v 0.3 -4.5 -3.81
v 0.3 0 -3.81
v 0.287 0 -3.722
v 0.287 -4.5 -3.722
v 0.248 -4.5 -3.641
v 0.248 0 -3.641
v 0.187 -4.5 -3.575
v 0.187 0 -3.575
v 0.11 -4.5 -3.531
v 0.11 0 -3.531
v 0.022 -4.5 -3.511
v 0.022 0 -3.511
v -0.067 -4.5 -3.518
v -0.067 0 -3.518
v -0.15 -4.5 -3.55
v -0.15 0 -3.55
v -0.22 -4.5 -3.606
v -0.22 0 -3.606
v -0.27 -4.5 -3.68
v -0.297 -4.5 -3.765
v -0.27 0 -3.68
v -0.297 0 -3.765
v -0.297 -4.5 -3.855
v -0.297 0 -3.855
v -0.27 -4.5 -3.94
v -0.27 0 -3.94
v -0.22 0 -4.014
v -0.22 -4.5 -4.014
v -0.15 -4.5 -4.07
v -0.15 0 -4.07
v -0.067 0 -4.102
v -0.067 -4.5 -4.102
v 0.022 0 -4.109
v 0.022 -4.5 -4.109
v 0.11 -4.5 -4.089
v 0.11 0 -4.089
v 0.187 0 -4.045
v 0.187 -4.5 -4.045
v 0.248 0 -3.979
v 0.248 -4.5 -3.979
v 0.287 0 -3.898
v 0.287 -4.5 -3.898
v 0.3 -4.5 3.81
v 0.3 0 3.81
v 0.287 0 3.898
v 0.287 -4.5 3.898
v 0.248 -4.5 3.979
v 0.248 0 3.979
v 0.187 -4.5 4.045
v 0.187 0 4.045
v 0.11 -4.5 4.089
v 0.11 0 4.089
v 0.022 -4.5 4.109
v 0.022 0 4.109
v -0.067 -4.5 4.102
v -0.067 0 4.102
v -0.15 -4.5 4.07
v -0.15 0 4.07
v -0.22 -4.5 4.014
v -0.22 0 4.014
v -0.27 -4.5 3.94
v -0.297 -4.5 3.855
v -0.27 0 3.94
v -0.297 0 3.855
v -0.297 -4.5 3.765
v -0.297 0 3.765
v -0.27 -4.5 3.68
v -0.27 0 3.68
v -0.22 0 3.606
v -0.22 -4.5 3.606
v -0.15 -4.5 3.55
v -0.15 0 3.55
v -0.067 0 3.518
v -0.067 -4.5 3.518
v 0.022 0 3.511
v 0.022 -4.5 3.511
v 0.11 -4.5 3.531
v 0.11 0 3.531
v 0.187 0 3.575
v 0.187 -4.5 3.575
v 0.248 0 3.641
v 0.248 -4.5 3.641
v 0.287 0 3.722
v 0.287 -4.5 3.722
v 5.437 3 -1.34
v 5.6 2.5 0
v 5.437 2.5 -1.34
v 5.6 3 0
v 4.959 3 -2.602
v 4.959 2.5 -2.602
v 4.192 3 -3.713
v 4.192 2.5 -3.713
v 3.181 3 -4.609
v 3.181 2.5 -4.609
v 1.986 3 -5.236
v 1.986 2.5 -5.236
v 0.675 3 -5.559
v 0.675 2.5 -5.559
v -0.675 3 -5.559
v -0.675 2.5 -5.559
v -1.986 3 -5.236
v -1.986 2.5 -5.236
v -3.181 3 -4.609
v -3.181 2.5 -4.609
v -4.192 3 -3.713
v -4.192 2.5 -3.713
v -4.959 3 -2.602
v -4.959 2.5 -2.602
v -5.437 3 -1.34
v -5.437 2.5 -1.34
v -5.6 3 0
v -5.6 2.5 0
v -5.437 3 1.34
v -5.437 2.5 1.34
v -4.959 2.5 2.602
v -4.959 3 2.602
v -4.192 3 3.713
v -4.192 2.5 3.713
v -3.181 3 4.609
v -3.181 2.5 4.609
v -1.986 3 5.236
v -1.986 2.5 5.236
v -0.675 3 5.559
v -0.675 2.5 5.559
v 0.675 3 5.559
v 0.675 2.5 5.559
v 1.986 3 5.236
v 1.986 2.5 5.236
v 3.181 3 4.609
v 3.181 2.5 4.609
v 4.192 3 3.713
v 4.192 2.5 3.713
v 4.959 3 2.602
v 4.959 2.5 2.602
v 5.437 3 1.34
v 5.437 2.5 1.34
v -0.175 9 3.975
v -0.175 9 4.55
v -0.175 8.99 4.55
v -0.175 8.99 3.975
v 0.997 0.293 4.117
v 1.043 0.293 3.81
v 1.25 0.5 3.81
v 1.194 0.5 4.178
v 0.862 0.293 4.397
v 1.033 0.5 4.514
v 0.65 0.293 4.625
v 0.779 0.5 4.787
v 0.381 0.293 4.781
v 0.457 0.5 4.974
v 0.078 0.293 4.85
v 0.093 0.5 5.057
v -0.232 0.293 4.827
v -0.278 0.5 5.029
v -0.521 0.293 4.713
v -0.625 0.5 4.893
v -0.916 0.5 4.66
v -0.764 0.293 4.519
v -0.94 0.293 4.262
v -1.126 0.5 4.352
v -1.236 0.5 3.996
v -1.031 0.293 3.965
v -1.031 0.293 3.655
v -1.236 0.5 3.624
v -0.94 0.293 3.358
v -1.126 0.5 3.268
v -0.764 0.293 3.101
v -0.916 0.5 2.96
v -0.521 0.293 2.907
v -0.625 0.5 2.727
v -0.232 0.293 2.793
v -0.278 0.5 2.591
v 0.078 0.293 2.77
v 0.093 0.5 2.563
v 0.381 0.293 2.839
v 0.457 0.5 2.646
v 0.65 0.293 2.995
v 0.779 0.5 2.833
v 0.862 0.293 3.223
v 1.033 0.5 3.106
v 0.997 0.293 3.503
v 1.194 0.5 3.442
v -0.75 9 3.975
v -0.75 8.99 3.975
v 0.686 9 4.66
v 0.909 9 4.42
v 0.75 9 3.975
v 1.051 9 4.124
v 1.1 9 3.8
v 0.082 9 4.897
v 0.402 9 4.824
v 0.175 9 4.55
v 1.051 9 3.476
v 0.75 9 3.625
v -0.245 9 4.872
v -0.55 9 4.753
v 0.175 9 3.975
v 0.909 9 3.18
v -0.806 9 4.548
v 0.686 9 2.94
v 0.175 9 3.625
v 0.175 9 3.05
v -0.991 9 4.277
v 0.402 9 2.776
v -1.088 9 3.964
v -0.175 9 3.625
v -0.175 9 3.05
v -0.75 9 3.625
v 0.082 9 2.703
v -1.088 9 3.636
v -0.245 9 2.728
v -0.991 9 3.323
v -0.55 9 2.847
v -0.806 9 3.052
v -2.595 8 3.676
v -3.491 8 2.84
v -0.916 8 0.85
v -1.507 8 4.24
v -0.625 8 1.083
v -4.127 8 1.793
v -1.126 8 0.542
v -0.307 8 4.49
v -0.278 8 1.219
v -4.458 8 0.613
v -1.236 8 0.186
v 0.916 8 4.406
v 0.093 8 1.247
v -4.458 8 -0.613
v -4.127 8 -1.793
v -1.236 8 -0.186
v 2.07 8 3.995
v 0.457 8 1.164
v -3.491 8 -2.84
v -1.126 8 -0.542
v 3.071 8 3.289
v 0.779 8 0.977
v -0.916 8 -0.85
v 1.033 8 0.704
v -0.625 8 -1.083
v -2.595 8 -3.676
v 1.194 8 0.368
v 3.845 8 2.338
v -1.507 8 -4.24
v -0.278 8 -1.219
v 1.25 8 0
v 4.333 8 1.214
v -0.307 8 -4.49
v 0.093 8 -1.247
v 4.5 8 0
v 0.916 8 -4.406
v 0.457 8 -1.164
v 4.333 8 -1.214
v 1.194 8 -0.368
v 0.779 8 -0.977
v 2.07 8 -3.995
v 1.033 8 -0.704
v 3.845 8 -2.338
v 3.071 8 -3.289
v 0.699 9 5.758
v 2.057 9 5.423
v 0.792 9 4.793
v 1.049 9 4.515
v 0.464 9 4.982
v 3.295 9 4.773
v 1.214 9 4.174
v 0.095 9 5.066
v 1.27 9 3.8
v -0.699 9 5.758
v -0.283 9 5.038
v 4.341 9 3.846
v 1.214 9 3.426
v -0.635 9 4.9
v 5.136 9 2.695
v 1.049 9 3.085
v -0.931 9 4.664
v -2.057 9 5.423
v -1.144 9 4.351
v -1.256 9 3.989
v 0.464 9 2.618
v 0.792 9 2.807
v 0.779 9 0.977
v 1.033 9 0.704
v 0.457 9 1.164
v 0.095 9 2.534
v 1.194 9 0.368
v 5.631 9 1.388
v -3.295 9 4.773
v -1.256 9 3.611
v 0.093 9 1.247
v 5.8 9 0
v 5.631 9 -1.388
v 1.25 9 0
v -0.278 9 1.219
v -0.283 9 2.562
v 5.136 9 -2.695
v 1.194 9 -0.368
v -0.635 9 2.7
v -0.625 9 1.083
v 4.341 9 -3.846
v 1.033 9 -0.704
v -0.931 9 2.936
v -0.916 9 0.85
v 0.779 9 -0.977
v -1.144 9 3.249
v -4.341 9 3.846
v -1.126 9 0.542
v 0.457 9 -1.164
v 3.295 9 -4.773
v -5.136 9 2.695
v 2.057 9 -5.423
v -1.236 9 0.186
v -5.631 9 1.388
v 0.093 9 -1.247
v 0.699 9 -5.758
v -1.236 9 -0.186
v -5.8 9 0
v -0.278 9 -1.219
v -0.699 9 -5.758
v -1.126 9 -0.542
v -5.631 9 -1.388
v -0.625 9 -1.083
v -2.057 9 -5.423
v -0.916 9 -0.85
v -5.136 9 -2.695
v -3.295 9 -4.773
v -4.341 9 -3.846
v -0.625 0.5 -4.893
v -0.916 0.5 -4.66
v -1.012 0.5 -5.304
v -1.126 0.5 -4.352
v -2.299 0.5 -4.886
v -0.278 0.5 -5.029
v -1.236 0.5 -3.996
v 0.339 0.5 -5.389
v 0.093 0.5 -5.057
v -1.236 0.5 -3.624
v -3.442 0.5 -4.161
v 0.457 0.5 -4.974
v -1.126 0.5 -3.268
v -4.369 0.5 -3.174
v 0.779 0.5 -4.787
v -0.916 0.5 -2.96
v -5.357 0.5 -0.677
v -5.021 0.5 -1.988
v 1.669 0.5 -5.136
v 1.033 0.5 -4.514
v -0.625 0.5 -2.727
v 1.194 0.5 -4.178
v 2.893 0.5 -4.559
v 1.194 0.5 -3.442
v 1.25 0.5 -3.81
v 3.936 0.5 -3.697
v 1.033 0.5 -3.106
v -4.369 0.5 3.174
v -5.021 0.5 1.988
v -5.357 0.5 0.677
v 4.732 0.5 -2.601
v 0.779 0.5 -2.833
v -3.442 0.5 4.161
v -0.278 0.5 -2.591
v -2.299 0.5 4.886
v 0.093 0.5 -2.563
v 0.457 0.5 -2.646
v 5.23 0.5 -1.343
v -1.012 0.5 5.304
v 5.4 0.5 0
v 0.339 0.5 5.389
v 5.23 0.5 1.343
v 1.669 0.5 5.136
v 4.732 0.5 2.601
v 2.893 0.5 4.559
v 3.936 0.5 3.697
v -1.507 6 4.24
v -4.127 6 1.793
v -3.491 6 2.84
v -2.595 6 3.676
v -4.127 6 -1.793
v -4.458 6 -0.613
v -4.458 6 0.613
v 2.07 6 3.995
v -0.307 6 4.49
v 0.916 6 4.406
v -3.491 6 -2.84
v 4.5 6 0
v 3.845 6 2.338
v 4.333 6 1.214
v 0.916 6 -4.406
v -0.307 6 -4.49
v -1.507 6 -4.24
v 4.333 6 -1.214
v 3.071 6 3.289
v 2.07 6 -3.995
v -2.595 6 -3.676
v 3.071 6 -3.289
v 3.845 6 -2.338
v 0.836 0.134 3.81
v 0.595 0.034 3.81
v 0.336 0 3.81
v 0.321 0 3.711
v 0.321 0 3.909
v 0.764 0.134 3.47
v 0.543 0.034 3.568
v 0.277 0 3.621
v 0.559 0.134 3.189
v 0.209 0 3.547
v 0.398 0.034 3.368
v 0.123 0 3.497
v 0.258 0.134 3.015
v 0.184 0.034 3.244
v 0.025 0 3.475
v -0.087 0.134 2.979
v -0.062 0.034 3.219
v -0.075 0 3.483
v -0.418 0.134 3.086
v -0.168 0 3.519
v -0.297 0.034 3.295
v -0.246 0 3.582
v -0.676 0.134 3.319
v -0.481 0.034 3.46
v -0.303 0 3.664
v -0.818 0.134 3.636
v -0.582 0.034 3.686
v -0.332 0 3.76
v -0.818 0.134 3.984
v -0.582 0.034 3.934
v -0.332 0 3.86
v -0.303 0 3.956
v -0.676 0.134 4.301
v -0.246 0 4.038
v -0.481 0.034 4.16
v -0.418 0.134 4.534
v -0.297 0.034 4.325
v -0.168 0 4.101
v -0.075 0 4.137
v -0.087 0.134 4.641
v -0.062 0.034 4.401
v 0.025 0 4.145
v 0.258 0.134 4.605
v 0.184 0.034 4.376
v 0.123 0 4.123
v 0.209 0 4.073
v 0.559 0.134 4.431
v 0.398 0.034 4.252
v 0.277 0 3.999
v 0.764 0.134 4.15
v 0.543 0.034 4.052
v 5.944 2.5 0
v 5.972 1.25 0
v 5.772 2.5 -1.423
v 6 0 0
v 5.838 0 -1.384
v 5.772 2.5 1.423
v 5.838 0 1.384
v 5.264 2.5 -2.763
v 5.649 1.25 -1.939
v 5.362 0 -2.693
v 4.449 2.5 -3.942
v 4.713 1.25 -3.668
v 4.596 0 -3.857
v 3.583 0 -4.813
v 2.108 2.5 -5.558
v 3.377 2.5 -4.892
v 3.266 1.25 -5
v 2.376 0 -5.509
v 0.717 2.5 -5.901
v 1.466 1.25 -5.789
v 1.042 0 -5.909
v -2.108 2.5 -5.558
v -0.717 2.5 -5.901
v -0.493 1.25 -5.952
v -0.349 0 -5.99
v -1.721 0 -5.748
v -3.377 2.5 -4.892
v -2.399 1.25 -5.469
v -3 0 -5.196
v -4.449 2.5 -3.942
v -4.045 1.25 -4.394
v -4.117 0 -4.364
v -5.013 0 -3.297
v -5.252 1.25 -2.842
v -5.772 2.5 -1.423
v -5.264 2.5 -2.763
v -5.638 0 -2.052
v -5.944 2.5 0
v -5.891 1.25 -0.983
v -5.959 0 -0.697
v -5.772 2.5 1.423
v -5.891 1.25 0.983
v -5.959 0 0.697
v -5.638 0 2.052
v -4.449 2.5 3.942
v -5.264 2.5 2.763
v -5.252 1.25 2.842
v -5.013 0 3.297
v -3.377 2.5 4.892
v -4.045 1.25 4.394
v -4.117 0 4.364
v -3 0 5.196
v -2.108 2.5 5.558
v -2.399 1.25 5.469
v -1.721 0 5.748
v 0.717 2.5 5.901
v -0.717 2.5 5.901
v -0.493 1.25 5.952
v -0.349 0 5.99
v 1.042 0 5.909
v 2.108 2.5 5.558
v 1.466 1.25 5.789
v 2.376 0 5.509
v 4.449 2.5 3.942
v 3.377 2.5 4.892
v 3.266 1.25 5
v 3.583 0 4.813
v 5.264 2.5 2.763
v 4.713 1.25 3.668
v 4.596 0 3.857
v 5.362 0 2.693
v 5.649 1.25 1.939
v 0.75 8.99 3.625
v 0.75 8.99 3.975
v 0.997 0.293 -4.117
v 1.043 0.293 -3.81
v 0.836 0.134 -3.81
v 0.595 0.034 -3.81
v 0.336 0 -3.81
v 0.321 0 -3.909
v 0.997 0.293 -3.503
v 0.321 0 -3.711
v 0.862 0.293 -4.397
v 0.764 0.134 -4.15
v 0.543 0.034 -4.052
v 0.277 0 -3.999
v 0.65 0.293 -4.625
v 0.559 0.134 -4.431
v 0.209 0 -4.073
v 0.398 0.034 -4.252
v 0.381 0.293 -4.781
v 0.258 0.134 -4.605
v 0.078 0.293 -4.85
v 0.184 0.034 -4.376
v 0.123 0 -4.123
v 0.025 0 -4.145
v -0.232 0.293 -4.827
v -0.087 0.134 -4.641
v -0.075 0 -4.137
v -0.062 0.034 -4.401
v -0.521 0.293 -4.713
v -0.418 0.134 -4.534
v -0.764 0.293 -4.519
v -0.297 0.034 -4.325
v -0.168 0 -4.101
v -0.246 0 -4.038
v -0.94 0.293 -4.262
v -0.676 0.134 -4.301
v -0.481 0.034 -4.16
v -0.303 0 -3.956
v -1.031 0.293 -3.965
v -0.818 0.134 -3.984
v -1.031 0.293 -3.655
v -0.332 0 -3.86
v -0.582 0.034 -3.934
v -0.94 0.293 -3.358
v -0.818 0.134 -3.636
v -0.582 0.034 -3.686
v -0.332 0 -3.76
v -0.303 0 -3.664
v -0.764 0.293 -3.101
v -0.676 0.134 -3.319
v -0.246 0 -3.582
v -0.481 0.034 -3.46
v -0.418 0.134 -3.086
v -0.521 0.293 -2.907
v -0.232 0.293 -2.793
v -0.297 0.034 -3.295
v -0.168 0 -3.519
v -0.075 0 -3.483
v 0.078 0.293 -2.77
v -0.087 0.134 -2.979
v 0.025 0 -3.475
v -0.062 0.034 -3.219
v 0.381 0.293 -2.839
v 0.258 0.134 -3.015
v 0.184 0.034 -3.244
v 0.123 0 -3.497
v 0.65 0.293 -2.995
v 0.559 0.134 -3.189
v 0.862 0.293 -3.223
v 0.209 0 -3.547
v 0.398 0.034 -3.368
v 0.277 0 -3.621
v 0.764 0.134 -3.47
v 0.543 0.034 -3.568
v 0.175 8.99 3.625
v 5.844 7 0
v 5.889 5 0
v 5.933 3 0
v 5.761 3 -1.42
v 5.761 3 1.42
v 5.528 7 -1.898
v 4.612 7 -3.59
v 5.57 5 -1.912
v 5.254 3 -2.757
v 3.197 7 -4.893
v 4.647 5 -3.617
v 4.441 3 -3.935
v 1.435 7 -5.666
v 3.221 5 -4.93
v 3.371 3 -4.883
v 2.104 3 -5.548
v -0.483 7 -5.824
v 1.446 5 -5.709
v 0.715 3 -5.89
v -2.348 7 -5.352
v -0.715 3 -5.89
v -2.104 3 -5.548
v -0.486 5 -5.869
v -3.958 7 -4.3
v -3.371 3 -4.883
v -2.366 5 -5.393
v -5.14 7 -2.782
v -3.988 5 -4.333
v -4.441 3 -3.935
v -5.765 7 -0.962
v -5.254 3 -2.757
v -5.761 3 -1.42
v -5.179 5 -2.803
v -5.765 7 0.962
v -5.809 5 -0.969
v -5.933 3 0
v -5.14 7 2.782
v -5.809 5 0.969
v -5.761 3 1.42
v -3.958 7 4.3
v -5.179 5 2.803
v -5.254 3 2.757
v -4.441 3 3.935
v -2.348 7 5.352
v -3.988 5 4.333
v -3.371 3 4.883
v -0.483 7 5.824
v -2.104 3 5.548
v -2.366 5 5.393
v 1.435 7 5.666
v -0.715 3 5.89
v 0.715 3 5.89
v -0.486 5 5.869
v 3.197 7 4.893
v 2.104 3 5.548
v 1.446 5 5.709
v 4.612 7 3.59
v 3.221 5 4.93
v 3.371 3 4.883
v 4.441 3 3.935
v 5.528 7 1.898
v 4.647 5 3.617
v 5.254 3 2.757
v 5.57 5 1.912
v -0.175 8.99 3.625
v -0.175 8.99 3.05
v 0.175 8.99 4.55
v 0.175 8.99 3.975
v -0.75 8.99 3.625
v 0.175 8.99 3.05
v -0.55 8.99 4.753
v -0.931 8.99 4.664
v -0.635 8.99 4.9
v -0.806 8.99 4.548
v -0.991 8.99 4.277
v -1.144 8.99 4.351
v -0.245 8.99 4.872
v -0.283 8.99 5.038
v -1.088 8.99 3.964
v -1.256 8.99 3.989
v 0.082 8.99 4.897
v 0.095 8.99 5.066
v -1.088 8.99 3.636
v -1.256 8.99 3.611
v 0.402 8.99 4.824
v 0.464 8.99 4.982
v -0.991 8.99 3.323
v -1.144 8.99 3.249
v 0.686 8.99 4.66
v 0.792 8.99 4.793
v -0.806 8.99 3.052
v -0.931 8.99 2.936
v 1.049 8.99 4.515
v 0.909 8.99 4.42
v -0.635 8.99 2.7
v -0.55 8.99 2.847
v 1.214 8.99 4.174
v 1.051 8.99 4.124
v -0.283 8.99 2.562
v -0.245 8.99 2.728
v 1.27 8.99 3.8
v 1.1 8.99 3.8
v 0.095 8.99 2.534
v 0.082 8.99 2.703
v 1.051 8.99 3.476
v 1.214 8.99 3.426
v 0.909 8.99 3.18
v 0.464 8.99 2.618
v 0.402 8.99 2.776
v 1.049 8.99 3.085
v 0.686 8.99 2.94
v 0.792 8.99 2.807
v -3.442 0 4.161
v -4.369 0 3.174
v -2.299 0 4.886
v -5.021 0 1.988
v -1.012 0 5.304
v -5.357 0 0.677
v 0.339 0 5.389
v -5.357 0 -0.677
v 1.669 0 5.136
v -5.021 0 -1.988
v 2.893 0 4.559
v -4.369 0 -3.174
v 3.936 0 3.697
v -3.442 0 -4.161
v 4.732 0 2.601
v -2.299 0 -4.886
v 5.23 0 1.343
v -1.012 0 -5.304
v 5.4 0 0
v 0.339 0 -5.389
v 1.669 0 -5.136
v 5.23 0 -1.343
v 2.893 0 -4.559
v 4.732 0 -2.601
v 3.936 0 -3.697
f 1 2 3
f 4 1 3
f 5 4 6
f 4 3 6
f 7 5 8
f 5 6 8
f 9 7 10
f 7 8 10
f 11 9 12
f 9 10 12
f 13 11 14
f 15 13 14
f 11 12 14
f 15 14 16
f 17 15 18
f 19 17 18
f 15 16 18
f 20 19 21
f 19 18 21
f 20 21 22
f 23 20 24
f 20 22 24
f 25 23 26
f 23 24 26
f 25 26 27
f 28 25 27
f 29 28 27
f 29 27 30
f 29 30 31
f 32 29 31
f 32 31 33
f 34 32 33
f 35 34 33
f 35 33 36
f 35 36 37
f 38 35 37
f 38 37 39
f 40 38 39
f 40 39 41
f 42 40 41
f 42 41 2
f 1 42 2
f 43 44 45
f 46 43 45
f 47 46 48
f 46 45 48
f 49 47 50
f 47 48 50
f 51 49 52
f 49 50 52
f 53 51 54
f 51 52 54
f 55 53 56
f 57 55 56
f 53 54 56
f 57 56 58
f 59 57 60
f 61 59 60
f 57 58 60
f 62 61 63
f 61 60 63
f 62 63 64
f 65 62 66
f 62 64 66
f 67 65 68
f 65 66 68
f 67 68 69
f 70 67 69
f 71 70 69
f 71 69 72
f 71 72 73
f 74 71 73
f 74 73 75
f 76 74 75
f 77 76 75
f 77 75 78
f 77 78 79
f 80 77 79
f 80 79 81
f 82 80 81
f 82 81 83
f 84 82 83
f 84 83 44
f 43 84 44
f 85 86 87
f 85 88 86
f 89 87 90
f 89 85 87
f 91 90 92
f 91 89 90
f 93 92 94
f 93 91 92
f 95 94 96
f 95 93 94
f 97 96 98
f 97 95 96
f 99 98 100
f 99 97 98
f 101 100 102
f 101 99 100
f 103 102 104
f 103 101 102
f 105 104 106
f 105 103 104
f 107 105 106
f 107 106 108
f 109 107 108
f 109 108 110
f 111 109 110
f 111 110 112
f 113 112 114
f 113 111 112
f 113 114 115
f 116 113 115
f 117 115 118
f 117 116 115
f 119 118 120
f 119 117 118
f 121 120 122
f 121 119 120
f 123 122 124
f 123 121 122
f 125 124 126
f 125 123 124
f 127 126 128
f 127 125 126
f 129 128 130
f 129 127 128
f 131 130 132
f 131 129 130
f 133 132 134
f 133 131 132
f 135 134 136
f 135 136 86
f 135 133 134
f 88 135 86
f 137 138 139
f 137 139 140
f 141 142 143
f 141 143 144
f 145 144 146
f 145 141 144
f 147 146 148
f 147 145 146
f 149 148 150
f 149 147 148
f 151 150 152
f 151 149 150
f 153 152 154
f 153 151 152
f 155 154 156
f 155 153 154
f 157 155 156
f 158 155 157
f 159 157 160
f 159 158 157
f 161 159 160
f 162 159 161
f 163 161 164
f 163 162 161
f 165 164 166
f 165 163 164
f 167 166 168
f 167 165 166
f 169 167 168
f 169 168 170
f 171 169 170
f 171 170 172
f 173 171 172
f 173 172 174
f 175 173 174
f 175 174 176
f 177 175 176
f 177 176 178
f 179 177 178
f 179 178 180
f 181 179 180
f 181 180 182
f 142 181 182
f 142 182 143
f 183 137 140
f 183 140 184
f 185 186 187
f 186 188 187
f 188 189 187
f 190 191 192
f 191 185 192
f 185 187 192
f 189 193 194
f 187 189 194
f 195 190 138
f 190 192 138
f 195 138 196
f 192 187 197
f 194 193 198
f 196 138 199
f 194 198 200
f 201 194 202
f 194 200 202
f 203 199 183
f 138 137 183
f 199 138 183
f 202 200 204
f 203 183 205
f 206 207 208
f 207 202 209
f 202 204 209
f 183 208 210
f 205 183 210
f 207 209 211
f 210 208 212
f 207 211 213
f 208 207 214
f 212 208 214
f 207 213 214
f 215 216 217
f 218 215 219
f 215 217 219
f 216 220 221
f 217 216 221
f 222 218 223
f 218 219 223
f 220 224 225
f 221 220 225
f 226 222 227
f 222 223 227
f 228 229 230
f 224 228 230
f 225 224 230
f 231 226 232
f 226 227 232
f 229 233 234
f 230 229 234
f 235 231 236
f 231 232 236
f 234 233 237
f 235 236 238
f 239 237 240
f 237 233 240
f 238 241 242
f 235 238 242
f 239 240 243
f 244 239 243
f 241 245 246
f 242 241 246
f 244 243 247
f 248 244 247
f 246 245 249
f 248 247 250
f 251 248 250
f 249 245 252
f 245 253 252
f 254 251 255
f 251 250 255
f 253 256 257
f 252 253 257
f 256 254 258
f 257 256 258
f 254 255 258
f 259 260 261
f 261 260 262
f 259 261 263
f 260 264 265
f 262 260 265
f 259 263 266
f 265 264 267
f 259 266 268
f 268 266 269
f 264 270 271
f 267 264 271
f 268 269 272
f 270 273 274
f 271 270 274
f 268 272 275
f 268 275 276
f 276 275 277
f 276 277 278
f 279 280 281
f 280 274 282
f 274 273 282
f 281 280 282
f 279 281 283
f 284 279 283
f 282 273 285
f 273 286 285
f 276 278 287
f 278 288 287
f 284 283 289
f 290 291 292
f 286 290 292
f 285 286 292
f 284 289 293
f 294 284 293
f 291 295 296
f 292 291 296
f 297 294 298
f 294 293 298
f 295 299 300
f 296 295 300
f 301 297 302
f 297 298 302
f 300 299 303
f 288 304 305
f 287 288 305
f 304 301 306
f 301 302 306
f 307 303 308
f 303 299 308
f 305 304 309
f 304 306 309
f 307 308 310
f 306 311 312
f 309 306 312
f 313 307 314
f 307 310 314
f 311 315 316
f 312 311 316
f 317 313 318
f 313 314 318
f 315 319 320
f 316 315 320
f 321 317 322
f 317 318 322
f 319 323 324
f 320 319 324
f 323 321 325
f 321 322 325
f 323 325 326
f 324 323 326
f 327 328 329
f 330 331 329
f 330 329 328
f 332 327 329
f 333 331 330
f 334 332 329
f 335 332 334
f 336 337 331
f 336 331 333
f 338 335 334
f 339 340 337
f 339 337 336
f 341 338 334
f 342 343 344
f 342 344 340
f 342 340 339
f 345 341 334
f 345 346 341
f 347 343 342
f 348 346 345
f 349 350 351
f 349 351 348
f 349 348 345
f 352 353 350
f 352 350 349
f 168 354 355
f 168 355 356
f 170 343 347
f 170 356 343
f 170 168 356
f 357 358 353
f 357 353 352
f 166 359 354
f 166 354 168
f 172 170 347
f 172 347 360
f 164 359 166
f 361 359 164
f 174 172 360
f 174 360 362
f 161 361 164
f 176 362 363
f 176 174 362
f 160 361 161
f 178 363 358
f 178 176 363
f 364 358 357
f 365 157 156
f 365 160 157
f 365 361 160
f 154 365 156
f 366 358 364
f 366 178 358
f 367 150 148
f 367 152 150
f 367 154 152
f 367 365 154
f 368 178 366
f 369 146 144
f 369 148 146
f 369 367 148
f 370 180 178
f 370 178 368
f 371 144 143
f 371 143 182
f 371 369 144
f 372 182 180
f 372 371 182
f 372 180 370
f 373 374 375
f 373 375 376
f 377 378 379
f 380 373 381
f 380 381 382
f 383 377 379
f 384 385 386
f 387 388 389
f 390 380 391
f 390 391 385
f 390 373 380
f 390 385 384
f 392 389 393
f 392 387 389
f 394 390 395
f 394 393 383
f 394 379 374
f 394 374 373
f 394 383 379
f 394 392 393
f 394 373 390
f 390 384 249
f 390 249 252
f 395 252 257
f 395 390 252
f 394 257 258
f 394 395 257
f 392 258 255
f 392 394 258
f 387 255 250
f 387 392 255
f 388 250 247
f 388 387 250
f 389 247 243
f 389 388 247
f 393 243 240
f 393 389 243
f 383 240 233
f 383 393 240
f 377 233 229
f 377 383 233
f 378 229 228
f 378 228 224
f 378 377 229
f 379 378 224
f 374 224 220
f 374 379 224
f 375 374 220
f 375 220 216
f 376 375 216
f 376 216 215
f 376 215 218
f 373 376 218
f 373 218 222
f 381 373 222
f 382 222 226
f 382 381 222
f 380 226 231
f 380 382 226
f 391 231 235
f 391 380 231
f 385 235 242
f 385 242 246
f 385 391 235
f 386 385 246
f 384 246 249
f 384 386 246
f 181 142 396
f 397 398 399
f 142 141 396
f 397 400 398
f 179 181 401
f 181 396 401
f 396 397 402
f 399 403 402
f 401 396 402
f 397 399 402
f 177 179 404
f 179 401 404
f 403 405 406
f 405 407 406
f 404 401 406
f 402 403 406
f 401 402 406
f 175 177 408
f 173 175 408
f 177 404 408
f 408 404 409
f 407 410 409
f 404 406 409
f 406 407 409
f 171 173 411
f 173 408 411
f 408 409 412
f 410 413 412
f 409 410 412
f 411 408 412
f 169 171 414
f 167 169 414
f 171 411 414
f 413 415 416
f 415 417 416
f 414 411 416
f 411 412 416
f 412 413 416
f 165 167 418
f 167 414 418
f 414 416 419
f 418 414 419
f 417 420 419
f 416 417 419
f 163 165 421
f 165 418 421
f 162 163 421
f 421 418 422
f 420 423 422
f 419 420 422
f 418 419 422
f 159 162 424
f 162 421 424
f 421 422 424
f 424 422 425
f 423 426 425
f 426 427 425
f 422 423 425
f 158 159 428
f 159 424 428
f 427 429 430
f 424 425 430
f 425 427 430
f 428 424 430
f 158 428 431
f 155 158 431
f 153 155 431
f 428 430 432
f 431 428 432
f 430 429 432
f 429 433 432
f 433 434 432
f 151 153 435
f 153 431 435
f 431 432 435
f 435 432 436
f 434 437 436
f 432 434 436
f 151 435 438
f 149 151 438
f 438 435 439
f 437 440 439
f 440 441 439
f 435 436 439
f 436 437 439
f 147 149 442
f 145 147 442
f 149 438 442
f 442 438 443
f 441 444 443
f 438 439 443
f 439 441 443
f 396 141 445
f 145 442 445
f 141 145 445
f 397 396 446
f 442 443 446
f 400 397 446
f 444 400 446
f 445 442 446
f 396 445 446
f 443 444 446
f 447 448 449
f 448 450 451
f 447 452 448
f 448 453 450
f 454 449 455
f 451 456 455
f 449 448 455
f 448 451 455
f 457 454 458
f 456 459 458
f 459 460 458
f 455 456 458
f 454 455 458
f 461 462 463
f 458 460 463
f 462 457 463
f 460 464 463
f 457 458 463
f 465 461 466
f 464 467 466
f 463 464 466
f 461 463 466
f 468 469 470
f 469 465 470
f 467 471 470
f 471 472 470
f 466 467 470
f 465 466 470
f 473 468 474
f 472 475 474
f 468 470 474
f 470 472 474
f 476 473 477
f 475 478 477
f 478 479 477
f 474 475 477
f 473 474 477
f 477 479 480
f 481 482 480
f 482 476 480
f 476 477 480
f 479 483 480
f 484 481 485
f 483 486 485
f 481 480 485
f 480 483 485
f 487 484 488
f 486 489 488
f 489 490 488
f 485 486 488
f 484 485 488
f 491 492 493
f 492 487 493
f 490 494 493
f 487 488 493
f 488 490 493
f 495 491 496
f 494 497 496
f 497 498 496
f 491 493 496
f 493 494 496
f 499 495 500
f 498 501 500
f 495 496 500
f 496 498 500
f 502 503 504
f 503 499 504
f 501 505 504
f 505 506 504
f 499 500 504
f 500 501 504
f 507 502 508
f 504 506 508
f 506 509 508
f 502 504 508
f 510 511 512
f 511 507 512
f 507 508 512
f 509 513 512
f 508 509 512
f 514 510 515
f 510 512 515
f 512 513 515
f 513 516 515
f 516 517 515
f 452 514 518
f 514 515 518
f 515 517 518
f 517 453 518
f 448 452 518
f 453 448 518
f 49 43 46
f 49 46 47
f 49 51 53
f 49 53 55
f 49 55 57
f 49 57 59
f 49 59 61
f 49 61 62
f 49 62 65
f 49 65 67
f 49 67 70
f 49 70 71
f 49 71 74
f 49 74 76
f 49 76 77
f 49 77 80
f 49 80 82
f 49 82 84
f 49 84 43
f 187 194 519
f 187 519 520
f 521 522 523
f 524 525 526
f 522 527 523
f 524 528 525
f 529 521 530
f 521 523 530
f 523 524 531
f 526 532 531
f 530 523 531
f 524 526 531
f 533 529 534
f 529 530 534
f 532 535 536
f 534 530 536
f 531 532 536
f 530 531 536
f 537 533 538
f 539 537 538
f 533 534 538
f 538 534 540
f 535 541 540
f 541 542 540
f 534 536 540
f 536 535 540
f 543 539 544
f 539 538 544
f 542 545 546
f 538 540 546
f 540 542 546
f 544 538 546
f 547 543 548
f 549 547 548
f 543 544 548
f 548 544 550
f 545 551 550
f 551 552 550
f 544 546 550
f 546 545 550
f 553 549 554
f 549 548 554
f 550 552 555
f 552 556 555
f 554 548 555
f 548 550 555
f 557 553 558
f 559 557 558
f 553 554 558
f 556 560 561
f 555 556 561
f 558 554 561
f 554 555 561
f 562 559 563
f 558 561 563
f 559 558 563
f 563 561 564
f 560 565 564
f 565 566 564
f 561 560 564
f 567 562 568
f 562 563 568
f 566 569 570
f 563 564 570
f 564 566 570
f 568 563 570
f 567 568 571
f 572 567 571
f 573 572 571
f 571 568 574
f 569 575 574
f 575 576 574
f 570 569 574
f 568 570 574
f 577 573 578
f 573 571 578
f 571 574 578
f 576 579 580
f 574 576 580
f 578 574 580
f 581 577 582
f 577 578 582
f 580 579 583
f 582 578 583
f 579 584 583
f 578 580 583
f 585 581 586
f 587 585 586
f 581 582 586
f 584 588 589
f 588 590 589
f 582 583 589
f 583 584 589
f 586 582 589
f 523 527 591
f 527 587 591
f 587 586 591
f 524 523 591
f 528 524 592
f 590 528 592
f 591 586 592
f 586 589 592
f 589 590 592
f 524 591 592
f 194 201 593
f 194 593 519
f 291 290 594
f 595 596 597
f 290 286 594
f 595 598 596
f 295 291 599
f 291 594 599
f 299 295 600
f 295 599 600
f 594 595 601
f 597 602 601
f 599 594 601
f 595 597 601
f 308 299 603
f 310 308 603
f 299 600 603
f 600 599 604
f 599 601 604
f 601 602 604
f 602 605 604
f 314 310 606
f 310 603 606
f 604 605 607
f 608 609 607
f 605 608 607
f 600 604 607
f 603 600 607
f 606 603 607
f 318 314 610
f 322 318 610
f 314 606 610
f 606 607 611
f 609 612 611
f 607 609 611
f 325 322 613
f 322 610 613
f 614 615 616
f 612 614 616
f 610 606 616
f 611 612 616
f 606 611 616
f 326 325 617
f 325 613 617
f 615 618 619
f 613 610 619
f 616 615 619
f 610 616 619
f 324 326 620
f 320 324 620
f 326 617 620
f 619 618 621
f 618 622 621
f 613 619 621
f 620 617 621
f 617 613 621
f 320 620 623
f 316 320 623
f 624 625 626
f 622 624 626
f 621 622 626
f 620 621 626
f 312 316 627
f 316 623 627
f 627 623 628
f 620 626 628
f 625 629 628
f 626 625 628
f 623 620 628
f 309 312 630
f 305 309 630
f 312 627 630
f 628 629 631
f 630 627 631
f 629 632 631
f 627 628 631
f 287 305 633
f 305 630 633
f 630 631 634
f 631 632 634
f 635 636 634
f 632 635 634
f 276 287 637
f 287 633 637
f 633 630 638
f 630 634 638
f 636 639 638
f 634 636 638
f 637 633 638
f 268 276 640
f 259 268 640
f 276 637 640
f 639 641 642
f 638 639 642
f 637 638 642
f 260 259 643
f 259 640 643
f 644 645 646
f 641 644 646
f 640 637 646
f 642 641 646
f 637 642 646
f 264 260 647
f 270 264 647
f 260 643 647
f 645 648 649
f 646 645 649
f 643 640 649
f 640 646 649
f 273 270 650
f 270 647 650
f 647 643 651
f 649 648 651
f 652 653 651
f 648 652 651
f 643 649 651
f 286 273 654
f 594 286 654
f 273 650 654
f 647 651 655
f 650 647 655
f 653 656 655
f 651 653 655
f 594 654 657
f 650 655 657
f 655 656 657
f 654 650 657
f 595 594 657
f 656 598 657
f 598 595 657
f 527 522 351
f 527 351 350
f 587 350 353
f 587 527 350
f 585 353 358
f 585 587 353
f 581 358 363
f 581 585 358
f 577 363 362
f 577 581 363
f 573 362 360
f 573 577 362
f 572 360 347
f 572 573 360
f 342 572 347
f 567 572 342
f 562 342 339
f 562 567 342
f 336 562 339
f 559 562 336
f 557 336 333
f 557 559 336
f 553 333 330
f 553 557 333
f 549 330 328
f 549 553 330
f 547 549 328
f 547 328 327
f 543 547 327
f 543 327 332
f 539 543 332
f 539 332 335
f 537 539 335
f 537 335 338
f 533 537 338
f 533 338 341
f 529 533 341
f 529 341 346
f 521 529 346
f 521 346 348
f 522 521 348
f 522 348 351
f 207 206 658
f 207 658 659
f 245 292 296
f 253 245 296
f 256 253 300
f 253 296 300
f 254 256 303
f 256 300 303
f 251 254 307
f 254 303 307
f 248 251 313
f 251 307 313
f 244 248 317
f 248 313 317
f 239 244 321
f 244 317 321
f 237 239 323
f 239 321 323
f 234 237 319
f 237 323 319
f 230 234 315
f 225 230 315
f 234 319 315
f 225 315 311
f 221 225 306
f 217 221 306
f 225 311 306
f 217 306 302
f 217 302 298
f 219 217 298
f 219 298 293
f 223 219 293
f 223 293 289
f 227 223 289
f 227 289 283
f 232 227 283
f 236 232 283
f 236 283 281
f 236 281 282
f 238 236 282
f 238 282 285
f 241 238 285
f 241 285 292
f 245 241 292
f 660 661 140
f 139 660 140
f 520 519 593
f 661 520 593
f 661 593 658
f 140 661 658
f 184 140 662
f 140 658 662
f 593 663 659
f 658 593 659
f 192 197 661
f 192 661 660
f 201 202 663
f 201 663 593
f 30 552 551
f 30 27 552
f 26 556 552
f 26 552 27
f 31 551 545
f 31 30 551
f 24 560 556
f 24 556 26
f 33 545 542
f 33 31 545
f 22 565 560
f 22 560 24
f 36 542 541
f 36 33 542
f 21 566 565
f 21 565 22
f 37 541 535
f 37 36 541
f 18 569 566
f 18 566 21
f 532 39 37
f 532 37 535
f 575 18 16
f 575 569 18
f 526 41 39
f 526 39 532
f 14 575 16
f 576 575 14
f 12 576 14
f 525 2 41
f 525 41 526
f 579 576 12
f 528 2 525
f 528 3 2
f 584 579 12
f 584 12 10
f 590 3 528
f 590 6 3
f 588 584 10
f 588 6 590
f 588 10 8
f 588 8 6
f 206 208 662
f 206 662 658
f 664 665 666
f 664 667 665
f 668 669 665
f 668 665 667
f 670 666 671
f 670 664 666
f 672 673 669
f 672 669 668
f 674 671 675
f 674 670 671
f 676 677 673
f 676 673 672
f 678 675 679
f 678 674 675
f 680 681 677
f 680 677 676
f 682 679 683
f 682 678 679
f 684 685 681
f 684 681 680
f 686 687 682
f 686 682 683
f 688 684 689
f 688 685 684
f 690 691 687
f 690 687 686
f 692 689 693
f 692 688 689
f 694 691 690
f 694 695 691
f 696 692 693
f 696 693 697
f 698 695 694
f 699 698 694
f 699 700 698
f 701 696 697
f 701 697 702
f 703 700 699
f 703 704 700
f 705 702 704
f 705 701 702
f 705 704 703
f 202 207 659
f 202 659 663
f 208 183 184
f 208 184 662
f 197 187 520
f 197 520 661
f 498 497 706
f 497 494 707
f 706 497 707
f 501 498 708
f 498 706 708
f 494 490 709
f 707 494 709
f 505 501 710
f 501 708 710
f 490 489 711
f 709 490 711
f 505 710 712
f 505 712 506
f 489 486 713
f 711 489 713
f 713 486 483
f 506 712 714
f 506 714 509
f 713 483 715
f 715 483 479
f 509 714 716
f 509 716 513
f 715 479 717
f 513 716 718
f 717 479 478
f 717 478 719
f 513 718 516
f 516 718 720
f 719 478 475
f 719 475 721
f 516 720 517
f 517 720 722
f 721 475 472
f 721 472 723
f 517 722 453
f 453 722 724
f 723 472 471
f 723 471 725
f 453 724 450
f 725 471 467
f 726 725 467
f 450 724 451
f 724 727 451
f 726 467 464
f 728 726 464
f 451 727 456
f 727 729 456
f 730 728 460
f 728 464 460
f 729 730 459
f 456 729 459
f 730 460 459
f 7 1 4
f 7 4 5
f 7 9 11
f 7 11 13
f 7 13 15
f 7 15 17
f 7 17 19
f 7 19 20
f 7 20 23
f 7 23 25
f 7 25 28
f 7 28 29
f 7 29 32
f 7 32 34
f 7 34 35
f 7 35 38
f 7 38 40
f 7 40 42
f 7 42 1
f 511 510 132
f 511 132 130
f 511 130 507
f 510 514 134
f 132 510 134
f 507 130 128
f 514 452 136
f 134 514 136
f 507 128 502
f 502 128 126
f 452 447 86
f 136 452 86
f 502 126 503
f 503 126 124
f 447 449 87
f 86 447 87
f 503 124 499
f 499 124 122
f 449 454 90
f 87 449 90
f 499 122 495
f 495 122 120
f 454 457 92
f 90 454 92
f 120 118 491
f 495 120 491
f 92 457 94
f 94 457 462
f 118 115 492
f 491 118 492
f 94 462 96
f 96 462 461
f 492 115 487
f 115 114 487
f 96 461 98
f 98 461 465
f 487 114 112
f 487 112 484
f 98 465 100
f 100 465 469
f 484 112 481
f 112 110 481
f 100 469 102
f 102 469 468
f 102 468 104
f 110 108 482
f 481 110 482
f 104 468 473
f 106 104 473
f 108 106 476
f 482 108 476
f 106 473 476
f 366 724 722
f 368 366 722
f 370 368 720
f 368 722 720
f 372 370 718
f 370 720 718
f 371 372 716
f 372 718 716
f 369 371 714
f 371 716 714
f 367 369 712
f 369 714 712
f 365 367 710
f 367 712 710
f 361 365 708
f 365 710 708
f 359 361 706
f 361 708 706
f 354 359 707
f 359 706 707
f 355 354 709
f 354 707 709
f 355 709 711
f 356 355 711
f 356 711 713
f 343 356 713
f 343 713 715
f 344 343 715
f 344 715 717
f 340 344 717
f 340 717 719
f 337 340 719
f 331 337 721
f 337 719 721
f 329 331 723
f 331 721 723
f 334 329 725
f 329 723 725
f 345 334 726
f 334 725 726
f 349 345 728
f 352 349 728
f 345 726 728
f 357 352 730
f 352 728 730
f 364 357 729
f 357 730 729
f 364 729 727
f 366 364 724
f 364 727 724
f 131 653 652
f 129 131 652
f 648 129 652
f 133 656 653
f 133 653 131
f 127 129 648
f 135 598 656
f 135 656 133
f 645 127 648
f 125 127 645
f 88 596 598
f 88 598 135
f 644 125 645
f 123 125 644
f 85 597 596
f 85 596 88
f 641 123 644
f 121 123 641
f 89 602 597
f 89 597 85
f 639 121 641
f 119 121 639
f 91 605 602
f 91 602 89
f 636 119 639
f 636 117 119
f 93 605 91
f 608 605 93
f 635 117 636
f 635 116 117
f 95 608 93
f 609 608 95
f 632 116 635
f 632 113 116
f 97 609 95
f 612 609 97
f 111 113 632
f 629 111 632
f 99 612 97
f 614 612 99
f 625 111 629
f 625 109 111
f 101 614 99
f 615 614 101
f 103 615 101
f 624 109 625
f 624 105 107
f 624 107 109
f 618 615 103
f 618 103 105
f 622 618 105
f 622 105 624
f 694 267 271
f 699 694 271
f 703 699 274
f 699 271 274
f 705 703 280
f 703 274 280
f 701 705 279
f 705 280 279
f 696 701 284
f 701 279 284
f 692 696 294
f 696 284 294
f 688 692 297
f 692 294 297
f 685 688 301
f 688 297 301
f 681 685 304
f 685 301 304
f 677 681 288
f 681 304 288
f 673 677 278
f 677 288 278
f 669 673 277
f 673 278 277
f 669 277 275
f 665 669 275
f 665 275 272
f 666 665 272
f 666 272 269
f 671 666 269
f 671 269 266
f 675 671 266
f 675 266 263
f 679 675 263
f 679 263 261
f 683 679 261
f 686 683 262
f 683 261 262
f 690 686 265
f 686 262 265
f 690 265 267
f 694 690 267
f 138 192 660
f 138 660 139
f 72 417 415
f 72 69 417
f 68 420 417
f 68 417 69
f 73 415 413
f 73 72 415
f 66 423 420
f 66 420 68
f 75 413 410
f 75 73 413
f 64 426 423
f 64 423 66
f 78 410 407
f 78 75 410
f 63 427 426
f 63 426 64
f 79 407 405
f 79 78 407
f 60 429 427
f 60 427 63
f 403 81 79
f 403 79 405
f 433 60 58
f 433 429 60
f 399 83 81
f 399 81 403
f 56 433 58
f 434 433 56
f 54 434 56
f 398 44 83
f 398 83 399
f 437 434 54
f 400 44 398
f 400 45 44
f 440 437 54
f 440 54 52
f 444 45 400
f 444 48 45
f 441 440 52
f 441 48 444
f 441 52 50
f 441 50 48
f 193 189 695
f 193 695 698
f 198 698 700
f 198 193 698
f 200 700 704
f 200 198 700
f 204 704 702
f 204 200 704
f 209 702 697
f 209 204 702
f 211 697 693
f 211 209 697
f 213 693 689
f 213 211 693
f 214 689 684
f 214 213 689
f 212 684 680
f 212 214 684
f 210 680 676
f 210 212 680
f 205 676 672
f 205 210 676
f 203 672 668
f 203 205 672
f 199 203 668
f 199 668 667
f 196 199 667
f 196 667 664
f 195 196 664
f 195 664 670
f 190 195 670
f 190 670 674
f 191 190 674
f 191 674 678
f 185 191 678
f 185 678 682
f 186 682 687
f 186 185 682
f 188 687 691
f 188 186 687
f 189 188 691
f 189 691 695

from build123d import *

# Parameters (mm, degrees)
SKETCH2_R           = 5.4
CUT_EXTRUDE1_DEPTH  = 0.5
SKETCH4_R           = 0.3
BOSS_EXTRUDE2_DEPTH = 5
SKETCH5_R           = 1.27
SKETCH5_R_2         = 1.1
CUT_EXTRUDE2_DEPTH  = 0.01
CUT_EXTRUDE3_DEPTH  = 0.01
SKETCH7_R           = 1.25
CUT_EXTRUDE4_DEPTH  = 3
SKETCH8_R           = 4.5
CUT_EXTRUDE5_DEPTH  = 2
SKETCH12_R          = 1.25
BOSS_EXTRUDE4_DEPTH = 0.5
BOSS_EXTRUDE4_TAPER = 45
FILLET3_R           = 1
SKETCH13_W          = 1
SKETCH13_H          = 0.5


with BuildPart() as part:
    # Sketch1 → Revolve1 (revolve)
    with BuildSketch(Plane.XY):
        Polygon((0, 0), (0, 9), (5.8, 9), (6, 0), align=None)
    revolve(axis=Axis((0, 0, 0), (0, 1, 0)))

    # Sketch2 → Cut-Extrude1 (cut)
    with BuildSketch(Plane.XZ):
        Circle(SKETCH2_R)
    extrude(amount=-CUT_EXTRUDE1_DEPTH, mode=Mode.SUBTRACT)

    # Sketch4 → Boss-Extrude2 (add)
    with BuildSketch(Plane.XZ.offset(-0.5)):
        with Locations((0, -3.81)):
            Circle(SKETCH4_R)
        with Locations((0, 3.81)):
            Circle(SKETCH4_R)
    extrude(amount=BOSS_EXTRUDE2_DEPTH)

    # Sketch5 → Cut-Extrude2 (cut)
    with BuildSketch(Plane(origin=(0, 9, 0), x_dir=(1, 0, 0), z_dir=(0, 1, 0))):
        with Locations((0, -3.8)):
            Circle(SKETCH5_R)
        with Locations((0, -3.8)):
            Circle(SKETCH5_R_2, mode=Mode.SUBTRACT)
    extrude(amount=-CUT_EXTRUDE2_DEPTH, mode=Mode.SUBTRACT)

    # Sketch6 → Cut-Extrude3 (cut)
    with BuildSketch(Plane(origin=(0, 9, 0), x_dir=(1, 0, 0), z_dir=(0, 1, 0))):
        Polygon((-0.175, -3.05), (0.175, -3.05), (0.175, -3.625), (0.75, -3.625), (0.75, -3.975), (0.175, -3.975), (0.175, -4.55), (-0.175, -4.55), (-0.175, -3.975), (-0.75, -3.975), (-0.75, -3.625), (-0.175, -3.625), align=None)
    extrude(amount=-CUT_EXTRUDE3_DEPTH, mode=Mode.SUBTRACT)

    # Sketch7 → Cut-Extrude4 (cut)
    with BuildSketch(Plane(origin=(0, 9, 0), x_dir=(1, 0, 0), z_dir=(0, 1, 0))):
        Circle(SKETCH7_R)
    extrude(amount=-CUT_EXTRUDE4_DEPTH, mode=Mode.SUBTRACT)

    # Sketch8 → Cut-Extrude5 (cut)
    with BuildSketch(Plane(origin=(0, 6, 0), x_dir=(1, 0, 0), z_dir=(0, 1, 0))):
        Circle(SKETCH8_R)
    extrude(amount=CUT_EXTRUDE5_DEPTH, mode=Mode.SUBTRACT)

    # Sketch12 → Boss-Extrude4 (add)
    with BuildSketch(Plane.XZ.offset(-0.5)):
        with Locations((0, 3.81)):
            Circle(SKETCH12_R)
        with Locations((0, -3.81)):
            Circle(SKETCH12_R)
    extrude(amount=BOSS_EXTRUDE4_DEPTH, taper=BOSS_EXTRUDE4_TAPER)

    # Fillet3
    fillet3_edges = [part.edges().sort_by_distance(p)[0] for p in [
        (-0.75, 0, 3.81),
        (-0.75, 0, -3.81),
    ]]
    fillet(fillet3_edges, radius=FILLET3_R)

    # Sketch13 → Cut-Revolve1 (revolve, cut)
    with BuildSketch(Plane.XY):
        with Locations((6.1, 2.75)):
            Rectangle(SKETCH13_W, SKETCH13_H)
    revolve(axis=Axis((0, 0, 0), (0, 1, 0)), mode=Mode.SUBTRACT)


solid = part.part
